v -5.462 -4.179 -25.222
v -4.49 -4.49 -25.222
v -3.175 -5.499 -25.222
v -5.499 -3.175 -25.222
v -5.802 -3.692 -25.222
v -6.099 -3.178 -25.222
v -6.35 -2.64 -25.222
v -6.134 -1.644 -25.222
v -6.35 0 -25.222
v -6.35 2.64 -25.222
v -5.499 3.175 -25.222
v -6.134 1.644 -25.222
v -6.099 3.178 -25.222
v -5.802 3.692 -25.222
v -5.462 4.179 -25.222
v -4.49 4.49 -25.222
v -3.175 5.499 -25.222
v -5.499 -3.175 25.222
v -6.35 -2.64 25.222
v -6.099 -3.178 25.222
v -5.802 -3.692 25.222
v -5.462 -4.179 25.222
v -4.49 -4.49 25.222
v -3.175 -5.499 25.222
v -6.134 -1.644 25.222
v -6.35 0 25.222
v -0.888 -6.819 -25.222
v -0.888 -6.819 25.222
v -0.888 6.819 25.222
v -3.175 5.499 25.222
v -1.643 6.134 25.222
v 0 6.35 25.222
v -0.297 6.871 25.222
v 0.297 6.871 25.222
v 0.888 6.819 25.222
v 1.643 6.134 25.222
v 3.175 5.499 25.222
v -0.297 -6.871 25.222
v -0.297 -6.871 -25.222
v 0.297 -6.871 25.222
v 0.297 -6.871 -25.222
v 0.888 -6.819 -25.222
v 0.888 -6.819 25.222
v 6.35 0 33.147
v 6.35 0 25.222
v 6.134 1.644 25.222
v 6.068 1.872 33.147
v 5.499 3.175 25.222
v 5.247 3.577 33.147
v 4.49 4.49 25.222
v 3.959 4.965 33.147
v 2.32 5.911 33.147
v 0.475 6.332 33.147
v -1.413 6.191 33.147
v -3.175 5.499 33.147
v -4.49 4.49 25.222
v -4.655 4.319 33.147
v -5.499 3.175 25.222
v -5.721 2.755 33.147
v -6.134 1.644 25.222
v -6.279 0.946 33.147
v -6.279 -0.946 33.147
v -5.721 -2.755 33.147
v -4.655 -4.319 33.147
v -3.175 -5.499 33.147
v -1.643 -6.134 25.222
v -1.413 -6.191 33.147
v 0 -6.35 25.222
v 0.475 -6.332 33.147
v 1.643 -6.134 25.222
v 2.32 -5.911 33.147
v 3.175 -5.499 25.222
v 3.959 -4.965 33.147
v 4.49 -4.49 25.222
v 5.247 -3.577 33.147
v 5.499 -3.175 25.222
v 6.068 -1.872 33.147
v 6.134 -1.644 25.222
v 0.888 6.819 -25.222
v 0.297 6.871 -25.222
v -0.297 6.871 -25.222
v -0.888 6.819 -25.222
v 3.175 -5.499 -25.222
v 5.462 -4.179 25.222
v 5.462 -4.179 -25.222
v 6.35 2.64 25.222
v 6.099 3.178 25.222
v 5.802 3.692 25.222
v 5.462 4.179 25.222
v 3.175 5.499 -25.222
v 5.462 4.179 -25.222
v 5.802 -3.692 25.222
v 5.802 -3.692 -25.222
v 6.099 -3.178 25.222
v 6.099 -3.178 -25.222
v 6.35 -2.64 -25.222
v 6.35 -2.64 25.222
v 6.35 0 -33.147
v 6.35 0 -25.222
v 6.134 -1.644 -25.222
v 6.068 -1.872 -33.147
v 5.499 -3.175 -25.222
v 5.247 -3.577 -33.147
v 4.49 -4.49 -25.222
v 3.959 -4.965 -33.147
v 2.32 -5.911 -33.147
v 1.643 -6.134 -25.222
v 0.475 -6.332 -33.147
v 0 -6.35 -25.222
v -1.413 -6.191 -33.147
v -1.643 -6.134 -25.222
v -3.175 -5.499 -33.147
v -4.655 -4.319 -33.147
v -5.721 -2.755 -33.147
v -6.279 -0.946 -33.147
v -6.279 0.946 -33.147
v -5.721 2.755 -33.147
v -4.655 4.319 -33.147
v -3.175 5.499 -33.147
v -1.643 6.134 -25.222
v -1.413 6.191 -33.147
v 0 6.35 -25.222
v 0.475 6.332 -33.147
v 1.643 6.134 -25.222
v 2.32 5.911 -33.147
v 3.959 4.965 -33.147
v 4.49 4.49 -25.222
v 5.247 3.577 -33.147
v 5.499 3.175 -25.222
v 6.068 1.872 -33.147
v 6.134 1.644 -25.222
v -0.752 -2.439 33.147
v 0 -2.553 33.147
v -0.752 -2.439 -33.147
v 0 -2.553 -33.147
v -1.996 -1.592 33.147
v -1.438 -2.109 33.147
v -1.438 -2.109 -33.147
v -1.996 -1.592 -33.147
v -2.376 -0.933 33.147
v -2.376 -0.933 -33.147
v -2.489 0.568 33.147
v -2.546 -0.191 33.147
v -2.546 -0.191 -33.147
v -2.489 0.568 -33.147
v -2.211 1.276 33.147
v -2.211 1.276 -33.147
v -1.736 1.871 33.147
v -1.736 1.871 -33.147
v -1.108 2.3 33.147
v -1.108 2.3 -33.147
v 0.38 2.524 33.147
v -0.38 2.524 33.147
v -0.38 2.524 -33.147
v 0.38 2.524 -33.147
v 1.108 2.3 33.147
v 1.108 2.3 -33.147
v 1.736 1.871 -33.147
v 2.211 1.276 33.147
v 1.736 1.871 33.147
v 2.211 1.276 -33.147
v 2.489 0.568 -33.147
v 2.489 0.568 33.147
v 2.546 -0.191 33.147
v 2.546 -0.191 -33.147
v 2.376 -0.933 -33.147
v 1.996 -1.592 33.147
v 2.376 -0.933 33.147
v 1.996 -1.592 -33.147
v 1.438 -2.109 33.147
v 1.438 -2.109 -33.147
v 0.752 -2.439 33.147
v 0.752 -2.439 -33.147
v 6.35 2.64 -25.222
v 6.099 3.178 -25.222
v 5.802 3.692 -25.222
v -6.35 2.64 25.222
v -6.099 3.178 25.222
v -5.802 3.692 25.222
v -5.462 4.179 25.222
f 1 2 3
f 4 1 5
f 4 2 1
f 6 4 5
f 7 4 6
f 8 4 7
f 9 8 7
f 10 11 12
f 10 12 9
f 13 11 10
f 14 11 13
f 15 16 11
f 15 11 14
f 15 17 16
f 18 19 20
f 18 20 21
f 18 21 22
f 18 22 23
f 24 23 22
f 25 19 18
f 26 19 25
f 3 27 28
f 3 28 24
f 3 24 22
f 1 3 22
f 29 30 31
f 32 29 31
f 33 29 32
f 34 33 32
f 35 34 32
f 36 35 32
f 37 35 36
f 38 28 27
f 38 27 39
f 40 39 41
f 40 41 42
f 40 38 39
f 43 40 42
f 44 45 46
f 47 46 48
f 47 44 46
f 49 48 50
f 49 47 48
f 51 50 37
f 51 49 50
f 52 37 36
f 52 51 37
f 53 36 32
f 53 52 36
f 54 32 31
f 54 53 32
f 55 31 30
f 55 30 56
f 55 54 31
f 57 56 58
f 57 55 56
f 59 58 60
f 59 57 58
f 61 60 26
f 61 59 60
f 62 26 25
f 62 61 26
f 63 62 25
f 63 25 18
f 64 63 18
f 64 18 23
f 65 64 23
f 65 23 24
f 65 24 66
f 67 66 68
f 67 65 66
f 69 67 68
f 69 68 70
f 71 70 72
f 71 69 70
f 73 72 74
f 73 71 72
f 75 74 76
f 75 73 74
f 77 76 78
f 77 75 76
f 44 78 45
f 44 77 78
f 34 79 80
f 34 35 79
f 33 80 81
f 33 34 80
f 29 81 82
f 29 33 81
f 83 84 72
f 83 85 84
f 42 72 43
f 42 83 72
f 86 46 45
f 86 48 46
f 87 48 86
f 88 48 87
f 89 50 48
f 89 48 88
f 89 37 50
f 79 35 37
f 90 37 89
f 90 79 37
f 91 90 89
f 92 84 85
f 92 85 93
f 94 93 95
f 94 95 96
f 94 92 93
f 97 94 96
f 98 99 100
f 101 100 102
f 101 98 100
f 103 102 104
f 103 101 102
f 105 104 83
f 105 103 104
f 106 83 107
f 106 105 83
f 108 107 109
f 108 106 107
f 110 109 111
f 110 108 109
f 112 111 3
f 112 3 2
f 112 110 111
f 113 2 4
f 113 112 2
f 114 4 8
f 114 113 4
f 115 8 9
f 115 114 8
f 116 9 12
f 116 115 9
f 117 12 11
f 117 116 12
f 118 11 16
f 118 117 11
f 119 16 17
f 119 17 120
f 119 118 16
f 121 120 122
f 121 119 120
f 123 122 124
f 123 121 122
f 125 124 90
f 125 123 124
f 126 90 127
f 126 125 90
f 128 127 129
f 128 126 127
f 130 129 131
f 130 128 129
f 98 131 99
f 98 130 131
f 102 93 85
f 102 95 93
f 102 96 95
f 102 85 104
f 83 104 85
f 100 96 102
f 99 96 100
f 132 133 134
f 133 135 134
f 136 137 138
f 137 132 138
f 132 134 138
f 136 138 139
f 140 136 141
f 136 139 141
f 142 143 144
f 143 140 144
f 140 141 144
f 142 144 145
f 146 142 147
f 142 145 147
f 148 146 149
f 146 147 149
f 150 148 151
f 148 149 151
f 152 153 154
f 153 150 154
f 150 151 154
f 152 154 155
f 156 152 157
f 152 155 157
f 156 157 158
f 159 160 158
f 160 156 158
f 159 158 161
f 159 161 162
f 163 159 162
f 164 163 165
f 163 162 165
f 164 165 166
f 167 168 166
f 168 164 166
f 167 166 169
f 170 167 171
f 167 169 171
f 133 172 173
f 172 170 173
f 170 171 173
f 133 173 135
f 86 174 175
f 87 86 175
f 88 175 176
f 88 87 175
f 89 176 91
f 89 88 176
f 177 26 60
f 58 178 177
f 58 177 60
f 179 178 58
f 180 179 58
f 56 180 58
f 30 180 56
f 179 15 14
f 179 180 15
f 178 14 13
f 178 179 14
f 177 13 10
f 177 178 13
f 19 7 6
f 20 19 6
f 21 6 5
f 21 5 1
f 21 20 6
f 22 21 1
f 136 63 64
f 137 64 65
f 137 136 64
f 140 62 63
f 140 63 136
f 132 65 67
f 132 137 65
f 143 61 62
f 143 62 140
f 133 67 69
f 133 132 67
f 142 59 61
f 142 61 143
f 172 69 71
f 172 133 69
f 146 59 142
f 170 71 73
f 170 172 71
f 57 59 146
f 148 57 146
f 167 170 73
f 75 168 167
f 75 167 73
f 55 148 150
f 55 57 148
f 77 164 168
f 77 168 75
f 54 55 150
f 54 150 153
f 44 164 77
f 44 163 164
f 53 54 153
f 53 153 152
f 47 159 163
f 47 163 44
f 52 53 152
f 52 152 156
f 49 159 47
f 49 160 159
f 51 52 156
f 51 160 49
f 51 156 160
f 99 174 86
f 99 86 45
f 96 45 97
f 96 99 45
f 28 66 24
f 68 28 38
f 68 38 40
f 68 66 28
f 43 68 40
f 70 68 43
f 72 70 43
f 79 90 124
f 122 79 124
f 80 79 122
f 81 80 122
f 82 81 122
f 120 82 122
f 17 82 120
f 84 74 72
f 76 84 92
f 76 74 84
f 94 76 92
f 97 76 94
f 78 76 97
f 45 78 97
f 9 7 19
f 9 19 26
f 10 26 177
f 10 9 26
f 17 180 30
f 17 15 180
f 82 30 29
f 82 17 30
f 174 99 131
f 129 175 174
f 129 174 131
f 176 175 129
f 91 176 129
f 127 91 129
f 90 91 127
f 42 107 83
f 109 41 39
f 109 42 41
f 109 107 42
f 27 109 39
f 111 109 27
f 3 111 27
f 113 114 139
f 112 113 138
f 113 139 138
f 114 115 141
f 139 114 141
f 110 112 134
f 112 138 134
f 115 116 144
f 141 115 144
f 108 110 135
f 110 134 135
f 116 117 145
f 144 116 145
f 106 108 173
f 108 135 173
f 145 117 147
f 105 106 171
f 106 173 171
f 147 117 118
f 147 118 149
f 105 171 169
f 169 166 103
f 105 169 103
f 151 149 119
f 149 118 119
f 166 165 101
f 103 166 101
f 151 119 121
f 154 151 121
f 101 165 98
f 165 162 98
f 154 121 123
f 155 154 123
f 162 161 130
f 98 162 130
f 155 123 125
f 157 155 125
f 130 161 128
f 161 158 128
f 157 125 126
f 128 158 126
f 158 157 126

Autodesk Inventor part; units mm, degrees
ref_plane "YZ Plane" through (0, 0, 0) normal (1, 0, 0) x (0, 1, 0)
ref_plane "XZ Plane" through (0, 0, 0) normal (0, 1, 0) x (-1, 0, 0)
ref_plane "XY Plane" through (0, 0, 0) normal (0, 0, 1) x (1, 0, 0)
sketch "Sketch1" plane through (0, 0, 0) normal (0, 0, 1) x (1, 0, 0)
  line L0 (-6.35, -3.6662) -> (-6.35, 3.6662)
  line L1 (-6.35, 3.6662) -> (0, 7.3323)
  line L2 (0, 7.3323) -> (6.35, 3.6662)
  line L3 (6.35, 3.6662) -> (6.35, -3.6662)
  line L4 (6.35, -3.6662) -> (0, -7.3323)
  line L5 (0, -7.3323) -> (-6.35, -3.6662)
  point P0 (0, 0)
  point P1 (0, 0)
  dimension "Size" = 12.7
extrude "Extrusion1" add sketch "Sketch1" along normal mid plane 66.294
sketch "Sketch3" plane through (0, 0, 33.147) normal (0, 0, 1) x (1, 0, 0)
  line L0 (-6.35, 3.6662) -> (0, 7.3323) construction
  line L1 (0, 7.3323) -> (6.35, 3.6662) construction
  line L2 (6.35, 3.6662) -> (6.35, -3.6662) construction
  line L3 (6.35, -3.6662) -> (0, -7.3323) construction
  line L4 (0, -7.3323) -> (-6.35, -3.6662) construction
  line L5 (-6.35, -3.6662) -> (-6.35, 3.6662) construction
  point P0 (0, 0)
hole "Hole1" at (0, 0, 33.147) direction (0, 0, -1) diameter 5.1054 end through all
sketch "Sketch4" plane through (0, 0, 33.147) normal (0, 0, 1) x (1, 0, 0)
  circle A0 centre (0, 0) radius 2.5527 construction
  line L0 (-6.35, 3.6662) -> (0, 7.3323) construction
  line L1 (0, 7.3323) -> (6.35, 3.6662) construction
  line L2 (6.35, 3.6662) -> (6.35, -3.6662) construction
  line L3 (6.35, -3.6662) -> (0, -7.3323) construction
  line L4 (0, -7.3323) -> (-6.35, -3.6662) construction
  line L5 (-6.35, -3.6662) -> (-6.35, 3.6662) construction
  circle A1 centre (0, 0) radius 6.8771
  circle A2 centre (0, 0) radius 8.89
  dimension "thunder" = 13.7541
  dimension "d16" = 17.78
extrude "Extrusion3" cut sketch "Sketch4" against normal through all
sketch "Sketch5" plane through (0, 0, 33.147) normal (0, 0, 1) x (1, 0, 0)
  circle A0 centre (0, 0) radius 2.5527 projected
  circle A1 centre (0, 0) radius 6.35
  arc A2 (5.4616, -4.1791) -> (6.35, -2.6403) centre (0, 0) ccw projected
  line L0 (6.35, -2.6403) -> (6.35, 2.6403) projected
  arc A3 (6.35, 2.6403) -> (5.4616, 4.1791) centre (0, 0) ccw projected
  line L1 (5.4616, 4.1791) -> (0.8884, 6.8194) projected
  arc A4 (0.8884, 6.8194) -> (-0.8884, 6.8194) centre (0, 0) ccw projected
  line L2 (-0.8884, 6.8194) -> (-5.4616, 4.1791) projected
  arc A5 (-5.4616, 4.1791) -> (-6.35, 2.6403) centre (0, 0) ccw projected
  line L3 (-6.35, 2.6403) -> (-6.35, -2.6403) projected
  arc A6 (-6.35, -2.6403) -> (-5.4616, -4.1791) centre (0, 0) ccw projected
  line L4 (-5.4616, -4.1791) -> (-0.8884, -6.8194) projected
  arc A7 (-0.8884, -6.8194) -> (0.8884, -6.8194) centre (0, 0) ccw projected
  line L5 (0.8884, -6.8194) -> (5.4616, -4.1791) projected
  circle A8 centre (0, 0) radius 2.5527 projected
  point P0 (3.175, -5.4993)
  point P1 (-3.175, -5.4993)
  point P2 (-6.35, 0)
  point P3 (-3.175, 5.4993)
  point P4 (3.175, 5.4993)
  point P5 (6.35, 0)
  dimension "d21" = 12.7
extrude "Extrusion4" cut sketch "Sketch5" against normal blind 7.9248 contours A0 | L0 A2 L5 A1 | A1 L1 A3 L0 | A1 L2 A4 L1 | L5 A7 L4 A1 | A1 L3 A5 L2 | L4 A6 L3 A1
mirror "Mirror2" about plane through (0, 0, 0) normal (0, 0, 1) of "Extrusion4"
equation "\"bearing\" = 25.4"
properties part number "GP9-007" material "Aluminum 6061"
